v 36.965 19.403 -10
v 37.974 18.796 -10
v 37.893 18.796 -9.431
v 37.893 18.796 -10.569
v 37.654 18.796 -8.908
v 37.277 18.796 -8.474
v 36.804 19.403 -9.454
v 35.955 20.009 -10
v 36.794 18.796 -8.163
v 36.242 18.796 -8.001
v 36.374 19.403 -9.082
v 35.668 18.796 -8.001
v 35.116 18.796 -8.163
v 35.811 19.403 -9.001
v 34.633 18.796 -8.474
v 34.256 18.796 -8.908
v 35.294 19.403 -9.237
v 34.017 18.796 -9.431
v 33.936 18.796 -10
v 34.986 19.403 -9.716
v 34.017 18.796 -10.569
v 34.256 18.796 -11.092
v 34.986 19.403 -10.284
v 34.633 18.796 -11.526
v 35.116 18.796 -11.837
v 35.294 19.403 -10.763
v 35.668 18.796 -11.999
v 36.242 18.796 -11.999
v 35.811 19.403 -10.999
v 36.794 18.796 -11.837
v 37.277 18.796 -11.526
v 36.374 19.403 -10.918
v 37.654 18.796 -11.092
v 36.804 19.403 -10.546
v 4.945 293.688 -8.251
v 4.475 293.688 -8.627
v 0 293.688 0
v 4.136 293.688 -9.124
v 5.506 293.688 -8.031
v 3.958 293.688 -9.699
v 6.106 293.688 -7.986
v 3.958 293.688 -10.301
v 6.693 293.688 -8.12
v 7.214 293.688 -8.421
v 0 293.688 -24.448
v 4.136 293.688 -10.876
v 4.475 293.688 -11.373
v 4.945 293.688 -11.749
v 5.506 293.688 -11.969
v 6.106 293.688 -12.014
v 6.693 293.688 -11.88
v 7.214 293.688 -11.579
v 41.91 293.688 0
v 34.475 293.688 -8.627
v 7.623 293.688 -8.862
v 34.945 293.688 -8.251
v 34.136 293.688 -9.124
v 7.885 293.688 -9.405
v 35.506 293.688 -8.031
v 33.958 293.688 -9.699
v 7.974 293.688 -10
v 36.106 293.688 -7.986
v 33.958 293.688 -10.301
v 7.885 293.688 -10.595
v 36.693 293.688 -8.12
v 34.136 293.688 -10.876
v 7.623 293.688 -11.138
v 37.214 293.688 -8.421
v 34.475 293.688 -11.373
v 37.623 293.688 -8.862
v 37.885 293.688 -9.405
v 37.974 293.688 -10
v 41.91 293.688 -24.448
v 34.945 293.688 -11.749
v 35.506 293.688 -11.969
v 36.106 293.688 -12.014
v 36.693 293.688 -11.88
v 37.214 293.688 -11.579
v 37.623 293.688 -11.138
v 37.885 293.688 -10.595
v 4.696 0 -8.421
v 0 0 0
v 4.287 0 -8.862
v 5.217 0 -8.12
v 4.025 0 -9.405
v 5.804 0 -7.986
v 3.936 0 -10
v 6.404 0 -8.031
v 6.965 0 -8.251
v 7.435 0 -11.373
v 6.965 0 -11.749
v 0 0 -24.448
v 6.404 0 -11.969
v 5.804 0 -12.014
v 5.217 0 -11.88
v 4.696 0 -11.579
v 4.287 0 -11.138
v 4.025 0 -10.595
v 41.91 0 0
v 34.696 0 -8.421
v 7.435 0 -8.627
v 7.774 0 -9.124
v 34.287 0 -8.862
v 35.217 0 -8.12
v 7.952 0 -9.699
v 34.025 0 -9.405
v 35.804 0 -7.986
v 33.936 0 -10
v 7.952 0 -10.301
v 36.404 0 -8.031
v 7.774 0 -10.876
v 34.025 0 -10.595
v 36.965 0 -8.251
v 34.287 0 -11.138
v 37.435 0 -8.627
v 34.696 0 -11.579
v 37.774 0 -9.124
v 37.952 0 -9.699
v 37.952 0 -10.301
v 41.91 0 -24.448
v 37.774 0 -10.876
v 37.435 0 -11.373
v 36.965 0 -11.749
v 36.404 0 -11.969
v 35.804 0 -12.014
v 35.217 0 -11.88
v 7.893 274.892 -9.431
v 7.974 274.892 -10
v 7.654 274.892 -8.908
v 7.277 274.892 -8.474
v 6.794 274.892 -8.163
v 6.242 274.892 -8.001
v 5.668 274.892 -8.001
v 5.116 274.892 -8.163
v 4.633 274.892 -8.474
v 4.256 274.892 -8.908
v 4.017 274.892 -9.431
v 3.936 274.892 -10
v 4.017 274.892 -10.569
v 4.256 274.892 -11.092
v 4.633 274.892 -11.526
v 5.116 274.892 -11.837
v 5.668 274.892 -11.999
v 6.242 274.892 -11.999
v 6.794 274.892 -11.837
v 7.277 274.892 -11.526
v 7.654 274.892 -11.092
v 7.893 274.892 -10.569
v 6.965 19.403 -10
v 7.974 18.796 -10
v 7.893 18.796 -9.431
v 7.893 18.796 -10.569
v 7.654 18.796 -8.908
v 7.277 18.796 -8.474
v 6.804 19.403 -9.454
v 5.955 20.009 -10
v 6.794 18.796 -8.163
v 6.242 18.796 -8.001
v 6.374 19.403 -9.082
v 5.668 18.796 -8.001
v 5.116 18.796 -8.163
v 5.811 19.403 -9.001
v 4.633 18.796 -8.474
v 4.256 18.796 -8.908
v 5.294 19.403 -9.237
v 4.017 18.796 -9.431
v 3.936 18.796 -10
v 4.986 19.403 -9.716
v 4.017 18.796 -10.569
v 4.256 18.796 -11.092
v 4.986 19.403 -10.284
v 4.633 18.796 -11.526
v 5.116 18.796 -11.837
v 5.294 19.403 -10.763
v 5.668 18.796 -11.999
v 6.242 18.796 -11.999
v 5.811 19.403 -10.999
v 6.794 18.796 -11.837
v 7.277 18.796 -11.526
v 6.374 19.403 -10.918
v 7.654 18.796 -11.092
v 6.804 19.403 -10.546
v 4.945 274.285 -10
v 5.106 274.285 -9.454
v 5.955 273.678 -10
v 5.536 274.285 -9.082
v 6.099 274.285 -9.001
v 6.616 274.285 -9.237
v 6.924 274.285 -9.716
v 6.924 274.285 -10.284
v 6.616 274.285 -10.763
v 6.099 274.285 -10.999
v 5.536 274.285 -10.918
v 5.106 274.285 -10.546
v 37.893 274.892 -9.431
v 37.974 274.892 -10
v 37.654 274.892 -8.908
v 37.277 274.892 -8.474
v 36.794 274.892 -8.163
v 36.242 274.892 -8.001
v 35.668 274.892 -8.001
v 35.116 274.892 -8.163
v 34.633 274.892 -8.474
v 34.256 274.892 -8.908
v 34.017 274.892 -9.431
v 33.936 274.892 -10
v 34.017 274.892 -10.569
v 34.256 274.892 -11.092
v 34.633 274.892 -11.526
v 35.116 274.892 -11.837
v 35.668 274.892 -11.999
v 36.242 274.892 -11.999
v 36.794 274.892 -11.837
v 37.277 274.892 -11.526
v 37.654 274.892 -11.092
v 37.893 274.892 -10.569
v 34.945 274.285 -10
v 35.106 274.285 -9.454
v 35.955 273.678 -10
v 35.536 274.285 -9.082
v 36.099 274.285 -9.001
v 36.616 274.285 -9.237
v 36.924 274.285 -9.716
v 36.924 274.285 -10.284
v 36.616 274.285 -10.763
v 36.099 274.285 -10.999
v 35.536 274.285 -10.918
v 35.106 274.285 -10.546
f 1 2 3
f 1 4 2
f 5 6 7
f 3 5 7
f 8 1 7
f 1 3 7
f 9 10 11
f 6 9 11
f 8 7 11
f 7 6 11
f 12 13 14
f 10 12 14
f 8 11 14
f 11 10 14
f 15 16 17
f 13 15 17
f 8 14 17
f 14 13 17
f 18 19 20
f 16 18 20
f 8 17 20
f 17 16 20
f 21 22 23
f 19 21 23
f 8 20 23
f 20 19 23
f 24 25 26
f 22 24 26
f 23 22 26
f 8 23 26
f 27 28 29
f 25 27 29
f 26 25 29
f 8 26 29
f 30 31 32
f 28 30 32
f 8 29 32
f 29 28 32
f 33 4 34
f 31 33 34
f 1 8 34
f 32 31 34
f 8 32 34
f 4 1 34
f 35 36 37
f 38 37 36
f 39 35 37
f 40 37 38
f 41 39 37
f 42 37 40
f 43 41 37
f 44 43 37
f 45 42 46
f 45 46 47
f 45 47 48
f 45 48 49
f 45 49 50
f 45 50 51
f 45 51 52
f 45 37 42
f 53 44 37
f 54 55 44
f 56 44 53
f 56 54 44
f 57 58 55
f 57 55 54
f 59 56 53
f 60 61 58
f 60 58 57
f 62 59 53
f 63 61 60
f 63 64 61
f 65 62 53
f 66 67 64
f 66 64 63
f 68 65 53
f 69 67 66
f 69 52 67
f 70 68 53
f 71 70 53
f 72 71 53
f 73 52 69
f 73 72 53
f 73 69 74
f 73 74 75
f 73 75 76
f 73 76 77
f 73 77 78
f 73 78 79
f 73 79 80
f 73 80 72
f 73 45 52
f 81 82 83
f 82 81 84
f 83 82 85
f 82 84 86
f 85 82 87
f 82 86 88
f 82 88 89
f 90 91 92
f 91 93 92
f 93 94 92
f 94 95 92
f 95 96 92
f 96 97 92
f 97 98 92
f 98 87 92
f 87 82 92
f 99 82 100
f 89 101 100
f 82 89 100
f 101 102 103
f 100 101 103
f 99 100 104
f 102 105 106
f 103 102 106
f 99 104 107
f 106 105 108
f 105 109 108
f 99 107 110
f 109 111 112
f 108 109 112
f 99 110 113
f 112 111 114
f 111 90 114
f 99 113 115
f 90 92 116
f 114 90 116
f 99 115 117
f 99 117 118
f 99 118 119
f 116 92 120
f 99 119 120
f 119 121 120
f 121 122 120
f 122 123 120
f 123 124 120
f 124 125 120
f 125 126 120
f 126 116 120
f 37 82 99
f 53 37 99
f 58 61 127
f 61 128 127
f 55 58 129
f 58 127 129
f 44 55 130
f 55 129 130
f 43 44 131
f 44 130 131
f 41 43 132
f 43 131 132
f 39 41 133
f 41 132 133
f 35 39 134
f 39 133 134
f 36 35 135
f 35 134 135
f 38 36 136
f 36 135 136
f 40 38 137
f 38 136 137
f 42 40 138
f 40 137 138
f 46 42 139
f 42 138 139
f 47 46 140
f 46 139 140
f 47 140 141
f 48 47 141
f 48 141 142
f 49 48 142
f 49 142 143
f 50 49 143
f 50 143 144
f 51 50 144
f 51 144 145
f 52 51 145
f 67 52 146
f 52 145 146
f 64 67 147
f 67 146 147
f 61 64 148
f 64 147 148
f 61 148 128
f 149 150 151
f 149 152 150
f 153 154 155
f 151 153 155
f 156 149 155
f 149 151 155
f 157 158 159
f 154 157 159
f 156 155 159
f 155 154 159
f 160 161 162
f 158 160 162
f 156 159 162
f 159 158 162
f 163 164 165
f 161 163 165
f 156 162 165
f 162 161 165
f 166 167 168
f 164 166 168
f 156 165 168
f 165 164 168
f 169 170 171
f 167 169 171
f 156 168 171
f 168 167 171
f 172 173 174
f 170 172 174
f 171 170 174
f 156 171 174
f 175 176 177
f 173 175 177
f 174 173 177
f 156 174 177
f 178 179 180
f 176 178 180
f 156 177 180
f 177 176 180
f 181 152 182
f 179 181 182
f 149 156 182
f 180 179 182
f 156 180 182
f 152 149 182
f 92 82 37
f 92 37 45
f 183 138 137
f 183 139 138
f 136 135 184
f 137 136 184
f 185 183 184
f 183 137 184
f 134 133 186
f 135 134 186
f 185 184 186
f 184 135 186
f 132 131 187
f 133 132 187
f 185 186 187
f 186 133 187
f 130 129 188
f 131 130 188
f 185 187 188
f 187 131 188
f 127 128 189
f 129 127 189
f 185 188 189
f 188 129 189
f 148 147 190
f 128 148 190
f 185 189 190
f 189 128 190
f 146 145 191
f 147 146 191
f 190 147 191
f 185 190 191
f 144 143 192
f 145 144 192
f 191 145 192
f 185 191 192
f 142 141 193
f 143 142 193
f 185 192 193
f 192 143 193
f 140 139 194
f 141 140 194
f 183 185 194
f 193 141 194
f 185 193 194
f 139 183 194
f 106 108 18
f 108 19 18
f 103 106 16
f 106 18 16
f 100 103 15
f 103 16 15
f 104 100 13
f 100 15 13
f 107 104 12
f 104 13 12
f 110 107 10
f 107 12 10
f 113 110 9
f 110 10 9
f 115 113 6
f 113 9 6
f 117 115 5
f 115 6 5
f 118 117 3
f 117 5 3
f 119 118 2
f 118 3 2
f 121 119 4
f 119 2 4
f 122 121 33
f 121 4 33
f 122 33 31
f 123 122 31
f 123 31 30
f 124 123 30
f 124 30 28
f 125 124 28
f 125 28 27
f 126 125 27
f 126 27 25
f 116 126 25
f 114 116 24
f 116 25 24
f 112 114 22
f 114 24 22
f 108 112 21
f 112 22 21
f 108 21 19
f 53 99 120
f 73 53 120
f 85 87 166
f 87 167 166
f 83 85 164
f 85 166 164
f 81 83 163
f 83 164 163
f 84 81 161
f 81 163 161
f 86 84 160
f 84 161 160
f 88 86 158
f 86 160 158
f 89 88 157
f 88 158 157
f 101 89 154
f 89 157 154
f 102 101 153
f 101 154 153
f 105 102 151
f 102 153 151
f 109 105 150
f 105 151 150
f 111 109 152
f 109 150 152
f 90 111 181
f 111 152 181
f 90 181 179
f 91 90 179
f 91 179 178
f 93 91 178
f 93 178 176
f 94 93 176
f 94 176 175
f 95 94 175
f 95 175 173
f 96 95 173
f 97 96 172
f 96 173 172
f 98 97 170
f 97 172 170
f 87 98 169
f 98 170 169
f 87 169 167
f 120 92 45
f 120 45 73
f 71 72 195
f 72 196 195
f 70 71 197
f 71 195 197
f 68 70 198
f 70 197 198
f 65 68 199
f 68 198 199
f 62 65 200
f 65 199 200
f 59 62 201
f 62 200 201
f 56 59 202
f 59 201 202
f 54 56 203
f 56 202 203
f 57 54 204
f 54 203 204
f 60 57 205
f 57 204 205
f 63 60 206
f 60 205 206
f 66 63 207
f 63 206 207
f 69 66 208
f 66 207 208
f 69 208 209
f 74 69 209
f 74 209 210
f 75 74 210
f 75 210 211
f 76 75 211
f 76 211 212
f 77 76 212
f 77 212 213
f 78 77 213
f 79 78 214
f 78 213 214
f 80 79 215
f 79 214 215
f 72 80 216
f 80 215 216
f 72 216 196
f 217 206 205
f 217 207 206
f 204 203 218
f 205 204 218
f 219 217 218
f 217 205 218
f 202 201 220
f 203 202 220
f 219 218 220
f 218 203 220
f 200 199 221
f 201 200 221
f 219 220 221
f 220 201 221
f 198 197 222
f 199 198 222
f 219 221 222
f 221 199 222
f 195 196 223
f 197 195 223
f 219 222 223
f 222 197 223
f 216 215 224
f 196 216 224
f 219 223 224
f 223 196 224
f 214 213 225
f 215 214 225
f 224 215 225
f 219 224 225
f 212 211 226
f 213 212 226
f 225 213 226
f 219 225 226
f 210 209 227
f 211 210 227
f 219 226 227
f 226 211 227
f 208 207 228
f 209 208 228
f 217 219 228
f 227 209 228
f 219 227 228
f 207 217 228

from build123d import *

# Parameters (mm, degrees)
SKETCH1_W                  = 41.91
SKETCH1_H                  = 24.4475
BOSS_EXTRUDE1_DEPTH        = 293.6875
F_10_32_TAPPED_HOLE1_D     = 4.0386
F_10_32_TAPPED_HOLE1_DEPTH = 18.796
F_10_32_TAPPED_HOLE1_TIP   = 1.213317848
F_10_32_TAPPED_HOLE3_D     = 4.0386
F_10_32_TAPPED_HOLE3_DEPTH = 18.796
F_10_32_TAPPED_HOLE3_TIP   = 1.213317848


with BuildPart() as part:
    # Sketch1 → Boss-Extrude1 (new body)
    with BuildSketch(Plane(origin=(0, 0, 0), x_dir=(1, 0, 0), z_dir=(0, 1, 0))):
        with Locations((20.955, 12.22375)):
            Rectangle(SKETCH1_W, SKETCH1_H)
    extrude(amount=BOSS_EXTRUDE1_DEPTH)

    # #10-32 Tapped Hole1
    with Locations(Plane(origin=(0, 293.6875, 0), x_dir=(-1, 0, 0), z_dir=(0, 1, 0))):
        with Locations((-5.955, -10), (-35.955, -10)):
            Hole(F_10_32_TAPPED_HOLE1_D / 2, depth=F_10_32_TAPPED_HOLE1_DEPTH)
            with Locations((0, 0, -(F_10_32_TAPPED_HOLE1_DEPTH + F_10_32_TAPPED_HOLE1_TIP / 2))):  # 118° drill point
                Cone(0, F_10_32_TAPPED_HOLE1_D / 2, F_10_32_TAPPED_HOLE1_TIP, mode=Mode.SUBTRACT)

    # #10-32 Tapped Hole3
    with Locations(Plane(origin=(51.003414264, 0, 2.457986719), x_dir=(1, 0, 0), z_dir=(0, -1, 0))):
        with Locations((-15.048414264, -12.457986785), (-45.048414264, -12.457986785)):
            Hole(F_10_32_TAPPED_HOLE3_D / 2, depth=F_10_32_TAPPED_HOLE3_DEPTH)
            with Locations((0, 0, -(F_10_32_TAPPED_HOLE3_DEPTH + F_10_32_TAPPED_HOLE3_TIP / 2))):  # 118° drill point
                Cone(0, F_10_32_TAPPED_HOLE3_D / 2, F_10_32_TAPPED_HOLE3_TIP, mode=Mode.SUBTRACT)


solid = part.part
